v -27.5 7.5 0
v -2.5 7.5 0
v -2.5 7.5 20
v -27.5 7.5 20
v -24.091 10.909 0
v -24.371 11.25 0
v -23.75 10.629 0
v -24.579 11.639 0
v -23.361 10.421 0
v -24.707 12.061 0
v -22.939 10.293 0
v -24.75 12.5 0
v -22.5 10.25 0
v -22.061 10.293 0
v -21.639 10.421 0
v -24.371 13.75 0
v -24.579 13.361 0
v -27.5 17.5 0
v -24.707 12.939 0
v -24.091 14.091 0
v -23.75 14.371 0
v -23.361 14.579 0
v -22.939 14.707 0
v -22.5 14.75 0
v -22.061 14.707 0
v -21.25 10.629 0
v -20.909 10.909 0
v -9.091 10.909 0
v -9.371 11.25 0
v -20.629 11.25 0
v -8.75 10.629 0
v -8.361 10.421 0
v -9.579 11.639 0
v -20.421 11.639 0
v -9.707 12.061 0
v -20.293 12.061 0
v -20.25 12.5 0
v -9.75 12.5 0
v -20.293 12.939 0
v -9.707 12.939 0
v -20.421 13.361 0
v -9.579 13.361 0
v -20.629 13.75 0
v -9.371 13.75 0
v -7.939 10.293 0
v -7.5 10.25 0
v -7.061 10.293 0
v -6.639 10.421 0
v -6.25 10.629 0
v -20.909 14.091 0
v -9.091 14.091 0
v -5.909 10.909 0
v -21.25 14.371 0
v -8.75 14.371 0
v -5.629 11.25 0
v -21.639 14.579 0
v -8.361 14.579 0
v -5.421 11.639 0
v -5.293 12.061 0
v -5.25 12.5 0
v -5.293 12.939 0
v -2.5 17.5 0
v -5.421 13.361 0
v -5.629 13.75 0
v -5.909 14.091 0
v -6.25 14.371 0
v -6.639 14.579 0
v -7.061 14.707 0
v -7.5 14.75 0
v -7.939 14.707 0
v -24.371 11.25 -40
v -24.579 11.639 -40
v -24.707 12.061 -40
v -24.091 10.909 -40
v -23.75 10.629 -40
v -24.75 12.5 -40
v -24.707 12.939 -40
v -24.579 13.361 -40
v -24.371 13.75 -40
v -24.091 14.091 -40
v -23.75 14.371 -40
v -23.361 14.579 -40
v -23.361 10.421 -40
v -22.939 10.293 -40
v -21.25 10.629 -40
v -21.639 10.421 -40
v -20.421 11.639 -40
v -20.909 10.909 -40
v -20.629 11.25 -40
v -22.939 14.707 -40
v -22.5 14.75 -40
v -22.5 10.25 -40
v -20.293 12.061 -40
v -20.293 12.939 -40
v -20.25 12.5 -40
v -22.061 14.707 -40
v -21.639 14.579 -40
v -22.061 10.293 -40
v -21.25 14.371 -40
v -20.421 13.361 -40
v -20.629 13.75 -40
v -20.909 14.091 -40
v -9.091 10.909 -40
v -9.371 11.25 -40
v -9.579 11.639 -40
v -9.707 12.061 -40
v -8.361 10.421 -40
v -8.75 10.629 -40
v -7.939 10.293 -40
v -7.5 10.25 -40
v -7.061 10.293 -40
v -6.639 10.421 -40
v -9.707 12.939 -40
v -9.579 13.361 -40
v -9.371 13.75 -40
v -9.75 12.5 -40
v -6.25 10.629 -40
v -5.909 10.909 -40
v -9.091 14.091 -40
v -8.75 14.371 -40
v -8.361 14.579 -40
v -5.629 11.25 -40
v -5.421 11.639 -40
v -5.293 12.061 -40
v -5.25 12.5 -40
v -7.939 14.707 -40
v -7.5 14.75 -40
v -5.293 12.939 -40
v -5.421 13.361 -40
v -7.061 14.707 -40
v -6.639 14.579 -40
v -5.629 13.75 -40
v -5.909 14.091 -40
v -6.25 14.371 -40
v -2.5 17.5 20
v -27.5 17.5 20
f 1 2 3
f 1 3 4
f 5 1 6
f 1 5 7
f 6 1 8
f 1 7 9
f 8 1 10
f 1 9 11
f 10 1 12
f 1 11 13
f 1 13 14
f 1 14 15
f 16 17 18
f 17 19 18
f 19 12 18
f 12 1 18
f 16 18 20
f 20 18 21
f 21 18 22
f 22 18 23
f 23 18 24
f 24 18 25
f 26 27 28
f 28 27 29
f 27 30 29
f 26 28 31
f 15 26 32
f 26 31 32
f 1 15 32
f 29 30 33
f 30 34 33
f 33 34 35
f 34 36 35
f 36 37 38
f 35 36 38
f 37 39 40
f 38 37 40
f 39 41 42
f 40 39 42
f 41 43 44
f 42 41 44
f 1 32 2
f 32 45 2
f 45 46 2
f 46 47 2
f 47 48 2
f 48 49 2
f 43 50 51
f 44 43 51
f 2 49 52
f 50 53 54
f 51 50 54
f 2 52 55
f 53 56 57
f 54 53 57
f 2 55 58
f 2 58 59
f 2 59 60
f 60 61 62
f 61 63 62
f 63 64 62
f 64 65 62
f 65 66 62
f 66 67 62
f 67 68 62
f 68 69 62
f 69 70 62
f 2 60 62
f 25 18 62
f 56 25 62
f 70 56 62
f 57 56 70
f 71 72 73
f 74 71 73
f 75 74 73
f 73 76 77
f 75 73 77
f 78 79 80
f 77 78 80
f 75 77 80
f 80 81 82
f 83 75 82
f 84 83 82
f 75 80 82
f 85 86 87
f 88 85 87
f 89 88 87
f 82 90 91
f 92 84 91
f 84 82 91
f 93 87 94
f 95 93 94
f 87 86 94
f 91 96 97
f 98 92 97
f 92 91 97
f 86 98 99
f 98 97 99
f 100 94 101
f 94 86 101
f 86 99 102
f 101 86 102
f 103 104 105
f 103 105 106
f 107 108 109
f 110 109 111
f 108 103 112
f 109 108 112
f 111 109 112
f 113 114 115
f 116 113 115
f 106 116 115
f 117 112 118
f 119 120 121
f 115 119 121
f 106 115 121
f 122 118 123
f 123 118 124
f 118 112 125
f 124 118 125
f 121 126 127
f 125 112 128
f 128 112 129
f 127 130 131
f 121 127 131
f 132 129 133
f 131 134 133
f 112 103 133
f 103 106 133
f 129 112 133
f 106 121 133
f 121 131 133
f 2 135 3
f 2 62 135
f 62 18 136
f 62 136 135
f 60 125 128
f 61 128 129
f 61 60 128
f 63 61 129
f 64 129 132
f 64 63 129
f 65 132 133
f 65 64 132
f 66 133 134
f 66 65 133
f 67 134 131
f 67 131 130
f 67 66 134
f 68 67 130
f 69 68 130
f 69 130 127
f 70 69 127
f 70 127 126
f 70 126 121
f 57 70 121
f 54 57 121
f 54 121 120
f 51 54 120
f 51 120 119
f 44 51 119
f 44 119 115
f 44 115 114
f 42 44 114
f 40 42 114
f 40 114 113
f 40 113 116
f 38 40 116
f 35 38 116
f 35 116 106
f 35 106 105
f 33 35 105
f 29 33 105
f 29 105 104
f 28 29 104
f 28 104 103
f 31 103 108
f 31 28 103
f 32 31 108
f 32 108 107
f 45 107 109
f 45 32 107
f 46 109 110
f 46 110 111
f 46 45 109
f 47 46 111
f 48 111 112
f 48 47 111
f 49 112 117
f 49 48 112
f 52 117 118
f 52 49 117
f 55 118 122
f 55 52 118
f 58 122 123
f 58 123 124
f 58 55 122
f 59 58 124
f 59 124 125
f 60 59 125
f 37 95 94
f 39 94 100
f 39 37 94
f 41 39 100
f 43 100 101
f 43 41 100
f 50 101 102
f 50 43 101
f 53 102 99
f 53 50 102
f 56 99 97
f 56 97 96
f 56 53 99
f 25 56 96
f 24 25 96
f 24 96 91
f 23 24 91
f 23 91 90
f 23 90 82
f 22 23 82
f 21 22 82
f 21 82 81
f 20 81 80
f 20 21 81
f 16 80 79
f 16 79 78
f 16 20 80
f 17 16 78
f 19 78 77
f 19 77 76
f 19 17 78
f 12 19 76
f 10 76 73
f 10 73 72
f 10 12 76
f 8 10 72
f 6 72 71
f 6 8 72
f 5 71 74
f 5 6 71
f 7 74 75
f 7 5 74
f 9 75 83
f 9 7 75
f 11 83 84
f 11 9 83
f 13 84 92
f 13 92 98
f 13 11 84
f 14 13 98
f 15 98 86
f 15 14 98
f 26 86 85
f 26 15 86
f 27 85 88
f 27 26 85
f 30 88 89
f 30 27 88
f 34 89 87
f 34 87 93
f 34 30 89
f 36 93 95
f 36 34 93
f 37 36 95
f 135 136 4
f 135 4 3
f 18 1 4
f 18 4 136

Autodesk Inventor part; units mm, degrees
ref_plane "YZ Plane" through (0, 0, 0) normal (1, 0, 0) x (0, 1, 0)
ref_plane "XZ Plane" through (0, 0, 0) normal (0, 1, 0) x (-1, 0, 0)
ref_plane "XY Plane" through (0, 0, 0) normal (0, 0, 1) x (1, 0, 0)
sketch "Sketch1" plane through (0, 0, 0) normal (0, 0, 1) x (1, 0, 0)
  line L0 (-2.5, 7.5) -> (-27.5, 7.5)
  line L1 (-27.5, 7.5) -> (-27.5, 17.5)
  line L2 (-27.5, 17.5) -> (-2.5, 17.5)
  line L3 (-2.5, 17.5) -> (-2.5, 7.5)
  point P0 (0, 0)
  dimension "d0" = 10
  dimension "d1" = 25
  dimension "d2" = 2.5
  dimension "d3" = 7.5
extrude "Extrusion1" add sketch "Sketch1" along normal blind 20
sketch "Sketch2" plane through (0, 0, 20) normal (0, 0, 1) x (1, 0, 0)
  circle A0 centre (-7.5, 12.5) radius 2.25
  circle A1 centre (-22.5, 12.5) radius 2.25
  line L0 (-27.5, 7.5) -> (-2.5, 7.5) projected
  line L1 (-27.5, 17.5) -> (-27.5, 7.5) projected
  line L2 (-2.5, 7.5) -> (-2.5, 17.5) projected
  point P0 (0, 0)
  dimension "d6" = 4.5
  dimension "d7" = 5
  dimension "d8" = 5
  dimension "d9" = 5
  dimension "d10" = 5
extrude "Extrusion2" add sketch "Sketch2" against normal blind 60
properties part number "arm_safe"
